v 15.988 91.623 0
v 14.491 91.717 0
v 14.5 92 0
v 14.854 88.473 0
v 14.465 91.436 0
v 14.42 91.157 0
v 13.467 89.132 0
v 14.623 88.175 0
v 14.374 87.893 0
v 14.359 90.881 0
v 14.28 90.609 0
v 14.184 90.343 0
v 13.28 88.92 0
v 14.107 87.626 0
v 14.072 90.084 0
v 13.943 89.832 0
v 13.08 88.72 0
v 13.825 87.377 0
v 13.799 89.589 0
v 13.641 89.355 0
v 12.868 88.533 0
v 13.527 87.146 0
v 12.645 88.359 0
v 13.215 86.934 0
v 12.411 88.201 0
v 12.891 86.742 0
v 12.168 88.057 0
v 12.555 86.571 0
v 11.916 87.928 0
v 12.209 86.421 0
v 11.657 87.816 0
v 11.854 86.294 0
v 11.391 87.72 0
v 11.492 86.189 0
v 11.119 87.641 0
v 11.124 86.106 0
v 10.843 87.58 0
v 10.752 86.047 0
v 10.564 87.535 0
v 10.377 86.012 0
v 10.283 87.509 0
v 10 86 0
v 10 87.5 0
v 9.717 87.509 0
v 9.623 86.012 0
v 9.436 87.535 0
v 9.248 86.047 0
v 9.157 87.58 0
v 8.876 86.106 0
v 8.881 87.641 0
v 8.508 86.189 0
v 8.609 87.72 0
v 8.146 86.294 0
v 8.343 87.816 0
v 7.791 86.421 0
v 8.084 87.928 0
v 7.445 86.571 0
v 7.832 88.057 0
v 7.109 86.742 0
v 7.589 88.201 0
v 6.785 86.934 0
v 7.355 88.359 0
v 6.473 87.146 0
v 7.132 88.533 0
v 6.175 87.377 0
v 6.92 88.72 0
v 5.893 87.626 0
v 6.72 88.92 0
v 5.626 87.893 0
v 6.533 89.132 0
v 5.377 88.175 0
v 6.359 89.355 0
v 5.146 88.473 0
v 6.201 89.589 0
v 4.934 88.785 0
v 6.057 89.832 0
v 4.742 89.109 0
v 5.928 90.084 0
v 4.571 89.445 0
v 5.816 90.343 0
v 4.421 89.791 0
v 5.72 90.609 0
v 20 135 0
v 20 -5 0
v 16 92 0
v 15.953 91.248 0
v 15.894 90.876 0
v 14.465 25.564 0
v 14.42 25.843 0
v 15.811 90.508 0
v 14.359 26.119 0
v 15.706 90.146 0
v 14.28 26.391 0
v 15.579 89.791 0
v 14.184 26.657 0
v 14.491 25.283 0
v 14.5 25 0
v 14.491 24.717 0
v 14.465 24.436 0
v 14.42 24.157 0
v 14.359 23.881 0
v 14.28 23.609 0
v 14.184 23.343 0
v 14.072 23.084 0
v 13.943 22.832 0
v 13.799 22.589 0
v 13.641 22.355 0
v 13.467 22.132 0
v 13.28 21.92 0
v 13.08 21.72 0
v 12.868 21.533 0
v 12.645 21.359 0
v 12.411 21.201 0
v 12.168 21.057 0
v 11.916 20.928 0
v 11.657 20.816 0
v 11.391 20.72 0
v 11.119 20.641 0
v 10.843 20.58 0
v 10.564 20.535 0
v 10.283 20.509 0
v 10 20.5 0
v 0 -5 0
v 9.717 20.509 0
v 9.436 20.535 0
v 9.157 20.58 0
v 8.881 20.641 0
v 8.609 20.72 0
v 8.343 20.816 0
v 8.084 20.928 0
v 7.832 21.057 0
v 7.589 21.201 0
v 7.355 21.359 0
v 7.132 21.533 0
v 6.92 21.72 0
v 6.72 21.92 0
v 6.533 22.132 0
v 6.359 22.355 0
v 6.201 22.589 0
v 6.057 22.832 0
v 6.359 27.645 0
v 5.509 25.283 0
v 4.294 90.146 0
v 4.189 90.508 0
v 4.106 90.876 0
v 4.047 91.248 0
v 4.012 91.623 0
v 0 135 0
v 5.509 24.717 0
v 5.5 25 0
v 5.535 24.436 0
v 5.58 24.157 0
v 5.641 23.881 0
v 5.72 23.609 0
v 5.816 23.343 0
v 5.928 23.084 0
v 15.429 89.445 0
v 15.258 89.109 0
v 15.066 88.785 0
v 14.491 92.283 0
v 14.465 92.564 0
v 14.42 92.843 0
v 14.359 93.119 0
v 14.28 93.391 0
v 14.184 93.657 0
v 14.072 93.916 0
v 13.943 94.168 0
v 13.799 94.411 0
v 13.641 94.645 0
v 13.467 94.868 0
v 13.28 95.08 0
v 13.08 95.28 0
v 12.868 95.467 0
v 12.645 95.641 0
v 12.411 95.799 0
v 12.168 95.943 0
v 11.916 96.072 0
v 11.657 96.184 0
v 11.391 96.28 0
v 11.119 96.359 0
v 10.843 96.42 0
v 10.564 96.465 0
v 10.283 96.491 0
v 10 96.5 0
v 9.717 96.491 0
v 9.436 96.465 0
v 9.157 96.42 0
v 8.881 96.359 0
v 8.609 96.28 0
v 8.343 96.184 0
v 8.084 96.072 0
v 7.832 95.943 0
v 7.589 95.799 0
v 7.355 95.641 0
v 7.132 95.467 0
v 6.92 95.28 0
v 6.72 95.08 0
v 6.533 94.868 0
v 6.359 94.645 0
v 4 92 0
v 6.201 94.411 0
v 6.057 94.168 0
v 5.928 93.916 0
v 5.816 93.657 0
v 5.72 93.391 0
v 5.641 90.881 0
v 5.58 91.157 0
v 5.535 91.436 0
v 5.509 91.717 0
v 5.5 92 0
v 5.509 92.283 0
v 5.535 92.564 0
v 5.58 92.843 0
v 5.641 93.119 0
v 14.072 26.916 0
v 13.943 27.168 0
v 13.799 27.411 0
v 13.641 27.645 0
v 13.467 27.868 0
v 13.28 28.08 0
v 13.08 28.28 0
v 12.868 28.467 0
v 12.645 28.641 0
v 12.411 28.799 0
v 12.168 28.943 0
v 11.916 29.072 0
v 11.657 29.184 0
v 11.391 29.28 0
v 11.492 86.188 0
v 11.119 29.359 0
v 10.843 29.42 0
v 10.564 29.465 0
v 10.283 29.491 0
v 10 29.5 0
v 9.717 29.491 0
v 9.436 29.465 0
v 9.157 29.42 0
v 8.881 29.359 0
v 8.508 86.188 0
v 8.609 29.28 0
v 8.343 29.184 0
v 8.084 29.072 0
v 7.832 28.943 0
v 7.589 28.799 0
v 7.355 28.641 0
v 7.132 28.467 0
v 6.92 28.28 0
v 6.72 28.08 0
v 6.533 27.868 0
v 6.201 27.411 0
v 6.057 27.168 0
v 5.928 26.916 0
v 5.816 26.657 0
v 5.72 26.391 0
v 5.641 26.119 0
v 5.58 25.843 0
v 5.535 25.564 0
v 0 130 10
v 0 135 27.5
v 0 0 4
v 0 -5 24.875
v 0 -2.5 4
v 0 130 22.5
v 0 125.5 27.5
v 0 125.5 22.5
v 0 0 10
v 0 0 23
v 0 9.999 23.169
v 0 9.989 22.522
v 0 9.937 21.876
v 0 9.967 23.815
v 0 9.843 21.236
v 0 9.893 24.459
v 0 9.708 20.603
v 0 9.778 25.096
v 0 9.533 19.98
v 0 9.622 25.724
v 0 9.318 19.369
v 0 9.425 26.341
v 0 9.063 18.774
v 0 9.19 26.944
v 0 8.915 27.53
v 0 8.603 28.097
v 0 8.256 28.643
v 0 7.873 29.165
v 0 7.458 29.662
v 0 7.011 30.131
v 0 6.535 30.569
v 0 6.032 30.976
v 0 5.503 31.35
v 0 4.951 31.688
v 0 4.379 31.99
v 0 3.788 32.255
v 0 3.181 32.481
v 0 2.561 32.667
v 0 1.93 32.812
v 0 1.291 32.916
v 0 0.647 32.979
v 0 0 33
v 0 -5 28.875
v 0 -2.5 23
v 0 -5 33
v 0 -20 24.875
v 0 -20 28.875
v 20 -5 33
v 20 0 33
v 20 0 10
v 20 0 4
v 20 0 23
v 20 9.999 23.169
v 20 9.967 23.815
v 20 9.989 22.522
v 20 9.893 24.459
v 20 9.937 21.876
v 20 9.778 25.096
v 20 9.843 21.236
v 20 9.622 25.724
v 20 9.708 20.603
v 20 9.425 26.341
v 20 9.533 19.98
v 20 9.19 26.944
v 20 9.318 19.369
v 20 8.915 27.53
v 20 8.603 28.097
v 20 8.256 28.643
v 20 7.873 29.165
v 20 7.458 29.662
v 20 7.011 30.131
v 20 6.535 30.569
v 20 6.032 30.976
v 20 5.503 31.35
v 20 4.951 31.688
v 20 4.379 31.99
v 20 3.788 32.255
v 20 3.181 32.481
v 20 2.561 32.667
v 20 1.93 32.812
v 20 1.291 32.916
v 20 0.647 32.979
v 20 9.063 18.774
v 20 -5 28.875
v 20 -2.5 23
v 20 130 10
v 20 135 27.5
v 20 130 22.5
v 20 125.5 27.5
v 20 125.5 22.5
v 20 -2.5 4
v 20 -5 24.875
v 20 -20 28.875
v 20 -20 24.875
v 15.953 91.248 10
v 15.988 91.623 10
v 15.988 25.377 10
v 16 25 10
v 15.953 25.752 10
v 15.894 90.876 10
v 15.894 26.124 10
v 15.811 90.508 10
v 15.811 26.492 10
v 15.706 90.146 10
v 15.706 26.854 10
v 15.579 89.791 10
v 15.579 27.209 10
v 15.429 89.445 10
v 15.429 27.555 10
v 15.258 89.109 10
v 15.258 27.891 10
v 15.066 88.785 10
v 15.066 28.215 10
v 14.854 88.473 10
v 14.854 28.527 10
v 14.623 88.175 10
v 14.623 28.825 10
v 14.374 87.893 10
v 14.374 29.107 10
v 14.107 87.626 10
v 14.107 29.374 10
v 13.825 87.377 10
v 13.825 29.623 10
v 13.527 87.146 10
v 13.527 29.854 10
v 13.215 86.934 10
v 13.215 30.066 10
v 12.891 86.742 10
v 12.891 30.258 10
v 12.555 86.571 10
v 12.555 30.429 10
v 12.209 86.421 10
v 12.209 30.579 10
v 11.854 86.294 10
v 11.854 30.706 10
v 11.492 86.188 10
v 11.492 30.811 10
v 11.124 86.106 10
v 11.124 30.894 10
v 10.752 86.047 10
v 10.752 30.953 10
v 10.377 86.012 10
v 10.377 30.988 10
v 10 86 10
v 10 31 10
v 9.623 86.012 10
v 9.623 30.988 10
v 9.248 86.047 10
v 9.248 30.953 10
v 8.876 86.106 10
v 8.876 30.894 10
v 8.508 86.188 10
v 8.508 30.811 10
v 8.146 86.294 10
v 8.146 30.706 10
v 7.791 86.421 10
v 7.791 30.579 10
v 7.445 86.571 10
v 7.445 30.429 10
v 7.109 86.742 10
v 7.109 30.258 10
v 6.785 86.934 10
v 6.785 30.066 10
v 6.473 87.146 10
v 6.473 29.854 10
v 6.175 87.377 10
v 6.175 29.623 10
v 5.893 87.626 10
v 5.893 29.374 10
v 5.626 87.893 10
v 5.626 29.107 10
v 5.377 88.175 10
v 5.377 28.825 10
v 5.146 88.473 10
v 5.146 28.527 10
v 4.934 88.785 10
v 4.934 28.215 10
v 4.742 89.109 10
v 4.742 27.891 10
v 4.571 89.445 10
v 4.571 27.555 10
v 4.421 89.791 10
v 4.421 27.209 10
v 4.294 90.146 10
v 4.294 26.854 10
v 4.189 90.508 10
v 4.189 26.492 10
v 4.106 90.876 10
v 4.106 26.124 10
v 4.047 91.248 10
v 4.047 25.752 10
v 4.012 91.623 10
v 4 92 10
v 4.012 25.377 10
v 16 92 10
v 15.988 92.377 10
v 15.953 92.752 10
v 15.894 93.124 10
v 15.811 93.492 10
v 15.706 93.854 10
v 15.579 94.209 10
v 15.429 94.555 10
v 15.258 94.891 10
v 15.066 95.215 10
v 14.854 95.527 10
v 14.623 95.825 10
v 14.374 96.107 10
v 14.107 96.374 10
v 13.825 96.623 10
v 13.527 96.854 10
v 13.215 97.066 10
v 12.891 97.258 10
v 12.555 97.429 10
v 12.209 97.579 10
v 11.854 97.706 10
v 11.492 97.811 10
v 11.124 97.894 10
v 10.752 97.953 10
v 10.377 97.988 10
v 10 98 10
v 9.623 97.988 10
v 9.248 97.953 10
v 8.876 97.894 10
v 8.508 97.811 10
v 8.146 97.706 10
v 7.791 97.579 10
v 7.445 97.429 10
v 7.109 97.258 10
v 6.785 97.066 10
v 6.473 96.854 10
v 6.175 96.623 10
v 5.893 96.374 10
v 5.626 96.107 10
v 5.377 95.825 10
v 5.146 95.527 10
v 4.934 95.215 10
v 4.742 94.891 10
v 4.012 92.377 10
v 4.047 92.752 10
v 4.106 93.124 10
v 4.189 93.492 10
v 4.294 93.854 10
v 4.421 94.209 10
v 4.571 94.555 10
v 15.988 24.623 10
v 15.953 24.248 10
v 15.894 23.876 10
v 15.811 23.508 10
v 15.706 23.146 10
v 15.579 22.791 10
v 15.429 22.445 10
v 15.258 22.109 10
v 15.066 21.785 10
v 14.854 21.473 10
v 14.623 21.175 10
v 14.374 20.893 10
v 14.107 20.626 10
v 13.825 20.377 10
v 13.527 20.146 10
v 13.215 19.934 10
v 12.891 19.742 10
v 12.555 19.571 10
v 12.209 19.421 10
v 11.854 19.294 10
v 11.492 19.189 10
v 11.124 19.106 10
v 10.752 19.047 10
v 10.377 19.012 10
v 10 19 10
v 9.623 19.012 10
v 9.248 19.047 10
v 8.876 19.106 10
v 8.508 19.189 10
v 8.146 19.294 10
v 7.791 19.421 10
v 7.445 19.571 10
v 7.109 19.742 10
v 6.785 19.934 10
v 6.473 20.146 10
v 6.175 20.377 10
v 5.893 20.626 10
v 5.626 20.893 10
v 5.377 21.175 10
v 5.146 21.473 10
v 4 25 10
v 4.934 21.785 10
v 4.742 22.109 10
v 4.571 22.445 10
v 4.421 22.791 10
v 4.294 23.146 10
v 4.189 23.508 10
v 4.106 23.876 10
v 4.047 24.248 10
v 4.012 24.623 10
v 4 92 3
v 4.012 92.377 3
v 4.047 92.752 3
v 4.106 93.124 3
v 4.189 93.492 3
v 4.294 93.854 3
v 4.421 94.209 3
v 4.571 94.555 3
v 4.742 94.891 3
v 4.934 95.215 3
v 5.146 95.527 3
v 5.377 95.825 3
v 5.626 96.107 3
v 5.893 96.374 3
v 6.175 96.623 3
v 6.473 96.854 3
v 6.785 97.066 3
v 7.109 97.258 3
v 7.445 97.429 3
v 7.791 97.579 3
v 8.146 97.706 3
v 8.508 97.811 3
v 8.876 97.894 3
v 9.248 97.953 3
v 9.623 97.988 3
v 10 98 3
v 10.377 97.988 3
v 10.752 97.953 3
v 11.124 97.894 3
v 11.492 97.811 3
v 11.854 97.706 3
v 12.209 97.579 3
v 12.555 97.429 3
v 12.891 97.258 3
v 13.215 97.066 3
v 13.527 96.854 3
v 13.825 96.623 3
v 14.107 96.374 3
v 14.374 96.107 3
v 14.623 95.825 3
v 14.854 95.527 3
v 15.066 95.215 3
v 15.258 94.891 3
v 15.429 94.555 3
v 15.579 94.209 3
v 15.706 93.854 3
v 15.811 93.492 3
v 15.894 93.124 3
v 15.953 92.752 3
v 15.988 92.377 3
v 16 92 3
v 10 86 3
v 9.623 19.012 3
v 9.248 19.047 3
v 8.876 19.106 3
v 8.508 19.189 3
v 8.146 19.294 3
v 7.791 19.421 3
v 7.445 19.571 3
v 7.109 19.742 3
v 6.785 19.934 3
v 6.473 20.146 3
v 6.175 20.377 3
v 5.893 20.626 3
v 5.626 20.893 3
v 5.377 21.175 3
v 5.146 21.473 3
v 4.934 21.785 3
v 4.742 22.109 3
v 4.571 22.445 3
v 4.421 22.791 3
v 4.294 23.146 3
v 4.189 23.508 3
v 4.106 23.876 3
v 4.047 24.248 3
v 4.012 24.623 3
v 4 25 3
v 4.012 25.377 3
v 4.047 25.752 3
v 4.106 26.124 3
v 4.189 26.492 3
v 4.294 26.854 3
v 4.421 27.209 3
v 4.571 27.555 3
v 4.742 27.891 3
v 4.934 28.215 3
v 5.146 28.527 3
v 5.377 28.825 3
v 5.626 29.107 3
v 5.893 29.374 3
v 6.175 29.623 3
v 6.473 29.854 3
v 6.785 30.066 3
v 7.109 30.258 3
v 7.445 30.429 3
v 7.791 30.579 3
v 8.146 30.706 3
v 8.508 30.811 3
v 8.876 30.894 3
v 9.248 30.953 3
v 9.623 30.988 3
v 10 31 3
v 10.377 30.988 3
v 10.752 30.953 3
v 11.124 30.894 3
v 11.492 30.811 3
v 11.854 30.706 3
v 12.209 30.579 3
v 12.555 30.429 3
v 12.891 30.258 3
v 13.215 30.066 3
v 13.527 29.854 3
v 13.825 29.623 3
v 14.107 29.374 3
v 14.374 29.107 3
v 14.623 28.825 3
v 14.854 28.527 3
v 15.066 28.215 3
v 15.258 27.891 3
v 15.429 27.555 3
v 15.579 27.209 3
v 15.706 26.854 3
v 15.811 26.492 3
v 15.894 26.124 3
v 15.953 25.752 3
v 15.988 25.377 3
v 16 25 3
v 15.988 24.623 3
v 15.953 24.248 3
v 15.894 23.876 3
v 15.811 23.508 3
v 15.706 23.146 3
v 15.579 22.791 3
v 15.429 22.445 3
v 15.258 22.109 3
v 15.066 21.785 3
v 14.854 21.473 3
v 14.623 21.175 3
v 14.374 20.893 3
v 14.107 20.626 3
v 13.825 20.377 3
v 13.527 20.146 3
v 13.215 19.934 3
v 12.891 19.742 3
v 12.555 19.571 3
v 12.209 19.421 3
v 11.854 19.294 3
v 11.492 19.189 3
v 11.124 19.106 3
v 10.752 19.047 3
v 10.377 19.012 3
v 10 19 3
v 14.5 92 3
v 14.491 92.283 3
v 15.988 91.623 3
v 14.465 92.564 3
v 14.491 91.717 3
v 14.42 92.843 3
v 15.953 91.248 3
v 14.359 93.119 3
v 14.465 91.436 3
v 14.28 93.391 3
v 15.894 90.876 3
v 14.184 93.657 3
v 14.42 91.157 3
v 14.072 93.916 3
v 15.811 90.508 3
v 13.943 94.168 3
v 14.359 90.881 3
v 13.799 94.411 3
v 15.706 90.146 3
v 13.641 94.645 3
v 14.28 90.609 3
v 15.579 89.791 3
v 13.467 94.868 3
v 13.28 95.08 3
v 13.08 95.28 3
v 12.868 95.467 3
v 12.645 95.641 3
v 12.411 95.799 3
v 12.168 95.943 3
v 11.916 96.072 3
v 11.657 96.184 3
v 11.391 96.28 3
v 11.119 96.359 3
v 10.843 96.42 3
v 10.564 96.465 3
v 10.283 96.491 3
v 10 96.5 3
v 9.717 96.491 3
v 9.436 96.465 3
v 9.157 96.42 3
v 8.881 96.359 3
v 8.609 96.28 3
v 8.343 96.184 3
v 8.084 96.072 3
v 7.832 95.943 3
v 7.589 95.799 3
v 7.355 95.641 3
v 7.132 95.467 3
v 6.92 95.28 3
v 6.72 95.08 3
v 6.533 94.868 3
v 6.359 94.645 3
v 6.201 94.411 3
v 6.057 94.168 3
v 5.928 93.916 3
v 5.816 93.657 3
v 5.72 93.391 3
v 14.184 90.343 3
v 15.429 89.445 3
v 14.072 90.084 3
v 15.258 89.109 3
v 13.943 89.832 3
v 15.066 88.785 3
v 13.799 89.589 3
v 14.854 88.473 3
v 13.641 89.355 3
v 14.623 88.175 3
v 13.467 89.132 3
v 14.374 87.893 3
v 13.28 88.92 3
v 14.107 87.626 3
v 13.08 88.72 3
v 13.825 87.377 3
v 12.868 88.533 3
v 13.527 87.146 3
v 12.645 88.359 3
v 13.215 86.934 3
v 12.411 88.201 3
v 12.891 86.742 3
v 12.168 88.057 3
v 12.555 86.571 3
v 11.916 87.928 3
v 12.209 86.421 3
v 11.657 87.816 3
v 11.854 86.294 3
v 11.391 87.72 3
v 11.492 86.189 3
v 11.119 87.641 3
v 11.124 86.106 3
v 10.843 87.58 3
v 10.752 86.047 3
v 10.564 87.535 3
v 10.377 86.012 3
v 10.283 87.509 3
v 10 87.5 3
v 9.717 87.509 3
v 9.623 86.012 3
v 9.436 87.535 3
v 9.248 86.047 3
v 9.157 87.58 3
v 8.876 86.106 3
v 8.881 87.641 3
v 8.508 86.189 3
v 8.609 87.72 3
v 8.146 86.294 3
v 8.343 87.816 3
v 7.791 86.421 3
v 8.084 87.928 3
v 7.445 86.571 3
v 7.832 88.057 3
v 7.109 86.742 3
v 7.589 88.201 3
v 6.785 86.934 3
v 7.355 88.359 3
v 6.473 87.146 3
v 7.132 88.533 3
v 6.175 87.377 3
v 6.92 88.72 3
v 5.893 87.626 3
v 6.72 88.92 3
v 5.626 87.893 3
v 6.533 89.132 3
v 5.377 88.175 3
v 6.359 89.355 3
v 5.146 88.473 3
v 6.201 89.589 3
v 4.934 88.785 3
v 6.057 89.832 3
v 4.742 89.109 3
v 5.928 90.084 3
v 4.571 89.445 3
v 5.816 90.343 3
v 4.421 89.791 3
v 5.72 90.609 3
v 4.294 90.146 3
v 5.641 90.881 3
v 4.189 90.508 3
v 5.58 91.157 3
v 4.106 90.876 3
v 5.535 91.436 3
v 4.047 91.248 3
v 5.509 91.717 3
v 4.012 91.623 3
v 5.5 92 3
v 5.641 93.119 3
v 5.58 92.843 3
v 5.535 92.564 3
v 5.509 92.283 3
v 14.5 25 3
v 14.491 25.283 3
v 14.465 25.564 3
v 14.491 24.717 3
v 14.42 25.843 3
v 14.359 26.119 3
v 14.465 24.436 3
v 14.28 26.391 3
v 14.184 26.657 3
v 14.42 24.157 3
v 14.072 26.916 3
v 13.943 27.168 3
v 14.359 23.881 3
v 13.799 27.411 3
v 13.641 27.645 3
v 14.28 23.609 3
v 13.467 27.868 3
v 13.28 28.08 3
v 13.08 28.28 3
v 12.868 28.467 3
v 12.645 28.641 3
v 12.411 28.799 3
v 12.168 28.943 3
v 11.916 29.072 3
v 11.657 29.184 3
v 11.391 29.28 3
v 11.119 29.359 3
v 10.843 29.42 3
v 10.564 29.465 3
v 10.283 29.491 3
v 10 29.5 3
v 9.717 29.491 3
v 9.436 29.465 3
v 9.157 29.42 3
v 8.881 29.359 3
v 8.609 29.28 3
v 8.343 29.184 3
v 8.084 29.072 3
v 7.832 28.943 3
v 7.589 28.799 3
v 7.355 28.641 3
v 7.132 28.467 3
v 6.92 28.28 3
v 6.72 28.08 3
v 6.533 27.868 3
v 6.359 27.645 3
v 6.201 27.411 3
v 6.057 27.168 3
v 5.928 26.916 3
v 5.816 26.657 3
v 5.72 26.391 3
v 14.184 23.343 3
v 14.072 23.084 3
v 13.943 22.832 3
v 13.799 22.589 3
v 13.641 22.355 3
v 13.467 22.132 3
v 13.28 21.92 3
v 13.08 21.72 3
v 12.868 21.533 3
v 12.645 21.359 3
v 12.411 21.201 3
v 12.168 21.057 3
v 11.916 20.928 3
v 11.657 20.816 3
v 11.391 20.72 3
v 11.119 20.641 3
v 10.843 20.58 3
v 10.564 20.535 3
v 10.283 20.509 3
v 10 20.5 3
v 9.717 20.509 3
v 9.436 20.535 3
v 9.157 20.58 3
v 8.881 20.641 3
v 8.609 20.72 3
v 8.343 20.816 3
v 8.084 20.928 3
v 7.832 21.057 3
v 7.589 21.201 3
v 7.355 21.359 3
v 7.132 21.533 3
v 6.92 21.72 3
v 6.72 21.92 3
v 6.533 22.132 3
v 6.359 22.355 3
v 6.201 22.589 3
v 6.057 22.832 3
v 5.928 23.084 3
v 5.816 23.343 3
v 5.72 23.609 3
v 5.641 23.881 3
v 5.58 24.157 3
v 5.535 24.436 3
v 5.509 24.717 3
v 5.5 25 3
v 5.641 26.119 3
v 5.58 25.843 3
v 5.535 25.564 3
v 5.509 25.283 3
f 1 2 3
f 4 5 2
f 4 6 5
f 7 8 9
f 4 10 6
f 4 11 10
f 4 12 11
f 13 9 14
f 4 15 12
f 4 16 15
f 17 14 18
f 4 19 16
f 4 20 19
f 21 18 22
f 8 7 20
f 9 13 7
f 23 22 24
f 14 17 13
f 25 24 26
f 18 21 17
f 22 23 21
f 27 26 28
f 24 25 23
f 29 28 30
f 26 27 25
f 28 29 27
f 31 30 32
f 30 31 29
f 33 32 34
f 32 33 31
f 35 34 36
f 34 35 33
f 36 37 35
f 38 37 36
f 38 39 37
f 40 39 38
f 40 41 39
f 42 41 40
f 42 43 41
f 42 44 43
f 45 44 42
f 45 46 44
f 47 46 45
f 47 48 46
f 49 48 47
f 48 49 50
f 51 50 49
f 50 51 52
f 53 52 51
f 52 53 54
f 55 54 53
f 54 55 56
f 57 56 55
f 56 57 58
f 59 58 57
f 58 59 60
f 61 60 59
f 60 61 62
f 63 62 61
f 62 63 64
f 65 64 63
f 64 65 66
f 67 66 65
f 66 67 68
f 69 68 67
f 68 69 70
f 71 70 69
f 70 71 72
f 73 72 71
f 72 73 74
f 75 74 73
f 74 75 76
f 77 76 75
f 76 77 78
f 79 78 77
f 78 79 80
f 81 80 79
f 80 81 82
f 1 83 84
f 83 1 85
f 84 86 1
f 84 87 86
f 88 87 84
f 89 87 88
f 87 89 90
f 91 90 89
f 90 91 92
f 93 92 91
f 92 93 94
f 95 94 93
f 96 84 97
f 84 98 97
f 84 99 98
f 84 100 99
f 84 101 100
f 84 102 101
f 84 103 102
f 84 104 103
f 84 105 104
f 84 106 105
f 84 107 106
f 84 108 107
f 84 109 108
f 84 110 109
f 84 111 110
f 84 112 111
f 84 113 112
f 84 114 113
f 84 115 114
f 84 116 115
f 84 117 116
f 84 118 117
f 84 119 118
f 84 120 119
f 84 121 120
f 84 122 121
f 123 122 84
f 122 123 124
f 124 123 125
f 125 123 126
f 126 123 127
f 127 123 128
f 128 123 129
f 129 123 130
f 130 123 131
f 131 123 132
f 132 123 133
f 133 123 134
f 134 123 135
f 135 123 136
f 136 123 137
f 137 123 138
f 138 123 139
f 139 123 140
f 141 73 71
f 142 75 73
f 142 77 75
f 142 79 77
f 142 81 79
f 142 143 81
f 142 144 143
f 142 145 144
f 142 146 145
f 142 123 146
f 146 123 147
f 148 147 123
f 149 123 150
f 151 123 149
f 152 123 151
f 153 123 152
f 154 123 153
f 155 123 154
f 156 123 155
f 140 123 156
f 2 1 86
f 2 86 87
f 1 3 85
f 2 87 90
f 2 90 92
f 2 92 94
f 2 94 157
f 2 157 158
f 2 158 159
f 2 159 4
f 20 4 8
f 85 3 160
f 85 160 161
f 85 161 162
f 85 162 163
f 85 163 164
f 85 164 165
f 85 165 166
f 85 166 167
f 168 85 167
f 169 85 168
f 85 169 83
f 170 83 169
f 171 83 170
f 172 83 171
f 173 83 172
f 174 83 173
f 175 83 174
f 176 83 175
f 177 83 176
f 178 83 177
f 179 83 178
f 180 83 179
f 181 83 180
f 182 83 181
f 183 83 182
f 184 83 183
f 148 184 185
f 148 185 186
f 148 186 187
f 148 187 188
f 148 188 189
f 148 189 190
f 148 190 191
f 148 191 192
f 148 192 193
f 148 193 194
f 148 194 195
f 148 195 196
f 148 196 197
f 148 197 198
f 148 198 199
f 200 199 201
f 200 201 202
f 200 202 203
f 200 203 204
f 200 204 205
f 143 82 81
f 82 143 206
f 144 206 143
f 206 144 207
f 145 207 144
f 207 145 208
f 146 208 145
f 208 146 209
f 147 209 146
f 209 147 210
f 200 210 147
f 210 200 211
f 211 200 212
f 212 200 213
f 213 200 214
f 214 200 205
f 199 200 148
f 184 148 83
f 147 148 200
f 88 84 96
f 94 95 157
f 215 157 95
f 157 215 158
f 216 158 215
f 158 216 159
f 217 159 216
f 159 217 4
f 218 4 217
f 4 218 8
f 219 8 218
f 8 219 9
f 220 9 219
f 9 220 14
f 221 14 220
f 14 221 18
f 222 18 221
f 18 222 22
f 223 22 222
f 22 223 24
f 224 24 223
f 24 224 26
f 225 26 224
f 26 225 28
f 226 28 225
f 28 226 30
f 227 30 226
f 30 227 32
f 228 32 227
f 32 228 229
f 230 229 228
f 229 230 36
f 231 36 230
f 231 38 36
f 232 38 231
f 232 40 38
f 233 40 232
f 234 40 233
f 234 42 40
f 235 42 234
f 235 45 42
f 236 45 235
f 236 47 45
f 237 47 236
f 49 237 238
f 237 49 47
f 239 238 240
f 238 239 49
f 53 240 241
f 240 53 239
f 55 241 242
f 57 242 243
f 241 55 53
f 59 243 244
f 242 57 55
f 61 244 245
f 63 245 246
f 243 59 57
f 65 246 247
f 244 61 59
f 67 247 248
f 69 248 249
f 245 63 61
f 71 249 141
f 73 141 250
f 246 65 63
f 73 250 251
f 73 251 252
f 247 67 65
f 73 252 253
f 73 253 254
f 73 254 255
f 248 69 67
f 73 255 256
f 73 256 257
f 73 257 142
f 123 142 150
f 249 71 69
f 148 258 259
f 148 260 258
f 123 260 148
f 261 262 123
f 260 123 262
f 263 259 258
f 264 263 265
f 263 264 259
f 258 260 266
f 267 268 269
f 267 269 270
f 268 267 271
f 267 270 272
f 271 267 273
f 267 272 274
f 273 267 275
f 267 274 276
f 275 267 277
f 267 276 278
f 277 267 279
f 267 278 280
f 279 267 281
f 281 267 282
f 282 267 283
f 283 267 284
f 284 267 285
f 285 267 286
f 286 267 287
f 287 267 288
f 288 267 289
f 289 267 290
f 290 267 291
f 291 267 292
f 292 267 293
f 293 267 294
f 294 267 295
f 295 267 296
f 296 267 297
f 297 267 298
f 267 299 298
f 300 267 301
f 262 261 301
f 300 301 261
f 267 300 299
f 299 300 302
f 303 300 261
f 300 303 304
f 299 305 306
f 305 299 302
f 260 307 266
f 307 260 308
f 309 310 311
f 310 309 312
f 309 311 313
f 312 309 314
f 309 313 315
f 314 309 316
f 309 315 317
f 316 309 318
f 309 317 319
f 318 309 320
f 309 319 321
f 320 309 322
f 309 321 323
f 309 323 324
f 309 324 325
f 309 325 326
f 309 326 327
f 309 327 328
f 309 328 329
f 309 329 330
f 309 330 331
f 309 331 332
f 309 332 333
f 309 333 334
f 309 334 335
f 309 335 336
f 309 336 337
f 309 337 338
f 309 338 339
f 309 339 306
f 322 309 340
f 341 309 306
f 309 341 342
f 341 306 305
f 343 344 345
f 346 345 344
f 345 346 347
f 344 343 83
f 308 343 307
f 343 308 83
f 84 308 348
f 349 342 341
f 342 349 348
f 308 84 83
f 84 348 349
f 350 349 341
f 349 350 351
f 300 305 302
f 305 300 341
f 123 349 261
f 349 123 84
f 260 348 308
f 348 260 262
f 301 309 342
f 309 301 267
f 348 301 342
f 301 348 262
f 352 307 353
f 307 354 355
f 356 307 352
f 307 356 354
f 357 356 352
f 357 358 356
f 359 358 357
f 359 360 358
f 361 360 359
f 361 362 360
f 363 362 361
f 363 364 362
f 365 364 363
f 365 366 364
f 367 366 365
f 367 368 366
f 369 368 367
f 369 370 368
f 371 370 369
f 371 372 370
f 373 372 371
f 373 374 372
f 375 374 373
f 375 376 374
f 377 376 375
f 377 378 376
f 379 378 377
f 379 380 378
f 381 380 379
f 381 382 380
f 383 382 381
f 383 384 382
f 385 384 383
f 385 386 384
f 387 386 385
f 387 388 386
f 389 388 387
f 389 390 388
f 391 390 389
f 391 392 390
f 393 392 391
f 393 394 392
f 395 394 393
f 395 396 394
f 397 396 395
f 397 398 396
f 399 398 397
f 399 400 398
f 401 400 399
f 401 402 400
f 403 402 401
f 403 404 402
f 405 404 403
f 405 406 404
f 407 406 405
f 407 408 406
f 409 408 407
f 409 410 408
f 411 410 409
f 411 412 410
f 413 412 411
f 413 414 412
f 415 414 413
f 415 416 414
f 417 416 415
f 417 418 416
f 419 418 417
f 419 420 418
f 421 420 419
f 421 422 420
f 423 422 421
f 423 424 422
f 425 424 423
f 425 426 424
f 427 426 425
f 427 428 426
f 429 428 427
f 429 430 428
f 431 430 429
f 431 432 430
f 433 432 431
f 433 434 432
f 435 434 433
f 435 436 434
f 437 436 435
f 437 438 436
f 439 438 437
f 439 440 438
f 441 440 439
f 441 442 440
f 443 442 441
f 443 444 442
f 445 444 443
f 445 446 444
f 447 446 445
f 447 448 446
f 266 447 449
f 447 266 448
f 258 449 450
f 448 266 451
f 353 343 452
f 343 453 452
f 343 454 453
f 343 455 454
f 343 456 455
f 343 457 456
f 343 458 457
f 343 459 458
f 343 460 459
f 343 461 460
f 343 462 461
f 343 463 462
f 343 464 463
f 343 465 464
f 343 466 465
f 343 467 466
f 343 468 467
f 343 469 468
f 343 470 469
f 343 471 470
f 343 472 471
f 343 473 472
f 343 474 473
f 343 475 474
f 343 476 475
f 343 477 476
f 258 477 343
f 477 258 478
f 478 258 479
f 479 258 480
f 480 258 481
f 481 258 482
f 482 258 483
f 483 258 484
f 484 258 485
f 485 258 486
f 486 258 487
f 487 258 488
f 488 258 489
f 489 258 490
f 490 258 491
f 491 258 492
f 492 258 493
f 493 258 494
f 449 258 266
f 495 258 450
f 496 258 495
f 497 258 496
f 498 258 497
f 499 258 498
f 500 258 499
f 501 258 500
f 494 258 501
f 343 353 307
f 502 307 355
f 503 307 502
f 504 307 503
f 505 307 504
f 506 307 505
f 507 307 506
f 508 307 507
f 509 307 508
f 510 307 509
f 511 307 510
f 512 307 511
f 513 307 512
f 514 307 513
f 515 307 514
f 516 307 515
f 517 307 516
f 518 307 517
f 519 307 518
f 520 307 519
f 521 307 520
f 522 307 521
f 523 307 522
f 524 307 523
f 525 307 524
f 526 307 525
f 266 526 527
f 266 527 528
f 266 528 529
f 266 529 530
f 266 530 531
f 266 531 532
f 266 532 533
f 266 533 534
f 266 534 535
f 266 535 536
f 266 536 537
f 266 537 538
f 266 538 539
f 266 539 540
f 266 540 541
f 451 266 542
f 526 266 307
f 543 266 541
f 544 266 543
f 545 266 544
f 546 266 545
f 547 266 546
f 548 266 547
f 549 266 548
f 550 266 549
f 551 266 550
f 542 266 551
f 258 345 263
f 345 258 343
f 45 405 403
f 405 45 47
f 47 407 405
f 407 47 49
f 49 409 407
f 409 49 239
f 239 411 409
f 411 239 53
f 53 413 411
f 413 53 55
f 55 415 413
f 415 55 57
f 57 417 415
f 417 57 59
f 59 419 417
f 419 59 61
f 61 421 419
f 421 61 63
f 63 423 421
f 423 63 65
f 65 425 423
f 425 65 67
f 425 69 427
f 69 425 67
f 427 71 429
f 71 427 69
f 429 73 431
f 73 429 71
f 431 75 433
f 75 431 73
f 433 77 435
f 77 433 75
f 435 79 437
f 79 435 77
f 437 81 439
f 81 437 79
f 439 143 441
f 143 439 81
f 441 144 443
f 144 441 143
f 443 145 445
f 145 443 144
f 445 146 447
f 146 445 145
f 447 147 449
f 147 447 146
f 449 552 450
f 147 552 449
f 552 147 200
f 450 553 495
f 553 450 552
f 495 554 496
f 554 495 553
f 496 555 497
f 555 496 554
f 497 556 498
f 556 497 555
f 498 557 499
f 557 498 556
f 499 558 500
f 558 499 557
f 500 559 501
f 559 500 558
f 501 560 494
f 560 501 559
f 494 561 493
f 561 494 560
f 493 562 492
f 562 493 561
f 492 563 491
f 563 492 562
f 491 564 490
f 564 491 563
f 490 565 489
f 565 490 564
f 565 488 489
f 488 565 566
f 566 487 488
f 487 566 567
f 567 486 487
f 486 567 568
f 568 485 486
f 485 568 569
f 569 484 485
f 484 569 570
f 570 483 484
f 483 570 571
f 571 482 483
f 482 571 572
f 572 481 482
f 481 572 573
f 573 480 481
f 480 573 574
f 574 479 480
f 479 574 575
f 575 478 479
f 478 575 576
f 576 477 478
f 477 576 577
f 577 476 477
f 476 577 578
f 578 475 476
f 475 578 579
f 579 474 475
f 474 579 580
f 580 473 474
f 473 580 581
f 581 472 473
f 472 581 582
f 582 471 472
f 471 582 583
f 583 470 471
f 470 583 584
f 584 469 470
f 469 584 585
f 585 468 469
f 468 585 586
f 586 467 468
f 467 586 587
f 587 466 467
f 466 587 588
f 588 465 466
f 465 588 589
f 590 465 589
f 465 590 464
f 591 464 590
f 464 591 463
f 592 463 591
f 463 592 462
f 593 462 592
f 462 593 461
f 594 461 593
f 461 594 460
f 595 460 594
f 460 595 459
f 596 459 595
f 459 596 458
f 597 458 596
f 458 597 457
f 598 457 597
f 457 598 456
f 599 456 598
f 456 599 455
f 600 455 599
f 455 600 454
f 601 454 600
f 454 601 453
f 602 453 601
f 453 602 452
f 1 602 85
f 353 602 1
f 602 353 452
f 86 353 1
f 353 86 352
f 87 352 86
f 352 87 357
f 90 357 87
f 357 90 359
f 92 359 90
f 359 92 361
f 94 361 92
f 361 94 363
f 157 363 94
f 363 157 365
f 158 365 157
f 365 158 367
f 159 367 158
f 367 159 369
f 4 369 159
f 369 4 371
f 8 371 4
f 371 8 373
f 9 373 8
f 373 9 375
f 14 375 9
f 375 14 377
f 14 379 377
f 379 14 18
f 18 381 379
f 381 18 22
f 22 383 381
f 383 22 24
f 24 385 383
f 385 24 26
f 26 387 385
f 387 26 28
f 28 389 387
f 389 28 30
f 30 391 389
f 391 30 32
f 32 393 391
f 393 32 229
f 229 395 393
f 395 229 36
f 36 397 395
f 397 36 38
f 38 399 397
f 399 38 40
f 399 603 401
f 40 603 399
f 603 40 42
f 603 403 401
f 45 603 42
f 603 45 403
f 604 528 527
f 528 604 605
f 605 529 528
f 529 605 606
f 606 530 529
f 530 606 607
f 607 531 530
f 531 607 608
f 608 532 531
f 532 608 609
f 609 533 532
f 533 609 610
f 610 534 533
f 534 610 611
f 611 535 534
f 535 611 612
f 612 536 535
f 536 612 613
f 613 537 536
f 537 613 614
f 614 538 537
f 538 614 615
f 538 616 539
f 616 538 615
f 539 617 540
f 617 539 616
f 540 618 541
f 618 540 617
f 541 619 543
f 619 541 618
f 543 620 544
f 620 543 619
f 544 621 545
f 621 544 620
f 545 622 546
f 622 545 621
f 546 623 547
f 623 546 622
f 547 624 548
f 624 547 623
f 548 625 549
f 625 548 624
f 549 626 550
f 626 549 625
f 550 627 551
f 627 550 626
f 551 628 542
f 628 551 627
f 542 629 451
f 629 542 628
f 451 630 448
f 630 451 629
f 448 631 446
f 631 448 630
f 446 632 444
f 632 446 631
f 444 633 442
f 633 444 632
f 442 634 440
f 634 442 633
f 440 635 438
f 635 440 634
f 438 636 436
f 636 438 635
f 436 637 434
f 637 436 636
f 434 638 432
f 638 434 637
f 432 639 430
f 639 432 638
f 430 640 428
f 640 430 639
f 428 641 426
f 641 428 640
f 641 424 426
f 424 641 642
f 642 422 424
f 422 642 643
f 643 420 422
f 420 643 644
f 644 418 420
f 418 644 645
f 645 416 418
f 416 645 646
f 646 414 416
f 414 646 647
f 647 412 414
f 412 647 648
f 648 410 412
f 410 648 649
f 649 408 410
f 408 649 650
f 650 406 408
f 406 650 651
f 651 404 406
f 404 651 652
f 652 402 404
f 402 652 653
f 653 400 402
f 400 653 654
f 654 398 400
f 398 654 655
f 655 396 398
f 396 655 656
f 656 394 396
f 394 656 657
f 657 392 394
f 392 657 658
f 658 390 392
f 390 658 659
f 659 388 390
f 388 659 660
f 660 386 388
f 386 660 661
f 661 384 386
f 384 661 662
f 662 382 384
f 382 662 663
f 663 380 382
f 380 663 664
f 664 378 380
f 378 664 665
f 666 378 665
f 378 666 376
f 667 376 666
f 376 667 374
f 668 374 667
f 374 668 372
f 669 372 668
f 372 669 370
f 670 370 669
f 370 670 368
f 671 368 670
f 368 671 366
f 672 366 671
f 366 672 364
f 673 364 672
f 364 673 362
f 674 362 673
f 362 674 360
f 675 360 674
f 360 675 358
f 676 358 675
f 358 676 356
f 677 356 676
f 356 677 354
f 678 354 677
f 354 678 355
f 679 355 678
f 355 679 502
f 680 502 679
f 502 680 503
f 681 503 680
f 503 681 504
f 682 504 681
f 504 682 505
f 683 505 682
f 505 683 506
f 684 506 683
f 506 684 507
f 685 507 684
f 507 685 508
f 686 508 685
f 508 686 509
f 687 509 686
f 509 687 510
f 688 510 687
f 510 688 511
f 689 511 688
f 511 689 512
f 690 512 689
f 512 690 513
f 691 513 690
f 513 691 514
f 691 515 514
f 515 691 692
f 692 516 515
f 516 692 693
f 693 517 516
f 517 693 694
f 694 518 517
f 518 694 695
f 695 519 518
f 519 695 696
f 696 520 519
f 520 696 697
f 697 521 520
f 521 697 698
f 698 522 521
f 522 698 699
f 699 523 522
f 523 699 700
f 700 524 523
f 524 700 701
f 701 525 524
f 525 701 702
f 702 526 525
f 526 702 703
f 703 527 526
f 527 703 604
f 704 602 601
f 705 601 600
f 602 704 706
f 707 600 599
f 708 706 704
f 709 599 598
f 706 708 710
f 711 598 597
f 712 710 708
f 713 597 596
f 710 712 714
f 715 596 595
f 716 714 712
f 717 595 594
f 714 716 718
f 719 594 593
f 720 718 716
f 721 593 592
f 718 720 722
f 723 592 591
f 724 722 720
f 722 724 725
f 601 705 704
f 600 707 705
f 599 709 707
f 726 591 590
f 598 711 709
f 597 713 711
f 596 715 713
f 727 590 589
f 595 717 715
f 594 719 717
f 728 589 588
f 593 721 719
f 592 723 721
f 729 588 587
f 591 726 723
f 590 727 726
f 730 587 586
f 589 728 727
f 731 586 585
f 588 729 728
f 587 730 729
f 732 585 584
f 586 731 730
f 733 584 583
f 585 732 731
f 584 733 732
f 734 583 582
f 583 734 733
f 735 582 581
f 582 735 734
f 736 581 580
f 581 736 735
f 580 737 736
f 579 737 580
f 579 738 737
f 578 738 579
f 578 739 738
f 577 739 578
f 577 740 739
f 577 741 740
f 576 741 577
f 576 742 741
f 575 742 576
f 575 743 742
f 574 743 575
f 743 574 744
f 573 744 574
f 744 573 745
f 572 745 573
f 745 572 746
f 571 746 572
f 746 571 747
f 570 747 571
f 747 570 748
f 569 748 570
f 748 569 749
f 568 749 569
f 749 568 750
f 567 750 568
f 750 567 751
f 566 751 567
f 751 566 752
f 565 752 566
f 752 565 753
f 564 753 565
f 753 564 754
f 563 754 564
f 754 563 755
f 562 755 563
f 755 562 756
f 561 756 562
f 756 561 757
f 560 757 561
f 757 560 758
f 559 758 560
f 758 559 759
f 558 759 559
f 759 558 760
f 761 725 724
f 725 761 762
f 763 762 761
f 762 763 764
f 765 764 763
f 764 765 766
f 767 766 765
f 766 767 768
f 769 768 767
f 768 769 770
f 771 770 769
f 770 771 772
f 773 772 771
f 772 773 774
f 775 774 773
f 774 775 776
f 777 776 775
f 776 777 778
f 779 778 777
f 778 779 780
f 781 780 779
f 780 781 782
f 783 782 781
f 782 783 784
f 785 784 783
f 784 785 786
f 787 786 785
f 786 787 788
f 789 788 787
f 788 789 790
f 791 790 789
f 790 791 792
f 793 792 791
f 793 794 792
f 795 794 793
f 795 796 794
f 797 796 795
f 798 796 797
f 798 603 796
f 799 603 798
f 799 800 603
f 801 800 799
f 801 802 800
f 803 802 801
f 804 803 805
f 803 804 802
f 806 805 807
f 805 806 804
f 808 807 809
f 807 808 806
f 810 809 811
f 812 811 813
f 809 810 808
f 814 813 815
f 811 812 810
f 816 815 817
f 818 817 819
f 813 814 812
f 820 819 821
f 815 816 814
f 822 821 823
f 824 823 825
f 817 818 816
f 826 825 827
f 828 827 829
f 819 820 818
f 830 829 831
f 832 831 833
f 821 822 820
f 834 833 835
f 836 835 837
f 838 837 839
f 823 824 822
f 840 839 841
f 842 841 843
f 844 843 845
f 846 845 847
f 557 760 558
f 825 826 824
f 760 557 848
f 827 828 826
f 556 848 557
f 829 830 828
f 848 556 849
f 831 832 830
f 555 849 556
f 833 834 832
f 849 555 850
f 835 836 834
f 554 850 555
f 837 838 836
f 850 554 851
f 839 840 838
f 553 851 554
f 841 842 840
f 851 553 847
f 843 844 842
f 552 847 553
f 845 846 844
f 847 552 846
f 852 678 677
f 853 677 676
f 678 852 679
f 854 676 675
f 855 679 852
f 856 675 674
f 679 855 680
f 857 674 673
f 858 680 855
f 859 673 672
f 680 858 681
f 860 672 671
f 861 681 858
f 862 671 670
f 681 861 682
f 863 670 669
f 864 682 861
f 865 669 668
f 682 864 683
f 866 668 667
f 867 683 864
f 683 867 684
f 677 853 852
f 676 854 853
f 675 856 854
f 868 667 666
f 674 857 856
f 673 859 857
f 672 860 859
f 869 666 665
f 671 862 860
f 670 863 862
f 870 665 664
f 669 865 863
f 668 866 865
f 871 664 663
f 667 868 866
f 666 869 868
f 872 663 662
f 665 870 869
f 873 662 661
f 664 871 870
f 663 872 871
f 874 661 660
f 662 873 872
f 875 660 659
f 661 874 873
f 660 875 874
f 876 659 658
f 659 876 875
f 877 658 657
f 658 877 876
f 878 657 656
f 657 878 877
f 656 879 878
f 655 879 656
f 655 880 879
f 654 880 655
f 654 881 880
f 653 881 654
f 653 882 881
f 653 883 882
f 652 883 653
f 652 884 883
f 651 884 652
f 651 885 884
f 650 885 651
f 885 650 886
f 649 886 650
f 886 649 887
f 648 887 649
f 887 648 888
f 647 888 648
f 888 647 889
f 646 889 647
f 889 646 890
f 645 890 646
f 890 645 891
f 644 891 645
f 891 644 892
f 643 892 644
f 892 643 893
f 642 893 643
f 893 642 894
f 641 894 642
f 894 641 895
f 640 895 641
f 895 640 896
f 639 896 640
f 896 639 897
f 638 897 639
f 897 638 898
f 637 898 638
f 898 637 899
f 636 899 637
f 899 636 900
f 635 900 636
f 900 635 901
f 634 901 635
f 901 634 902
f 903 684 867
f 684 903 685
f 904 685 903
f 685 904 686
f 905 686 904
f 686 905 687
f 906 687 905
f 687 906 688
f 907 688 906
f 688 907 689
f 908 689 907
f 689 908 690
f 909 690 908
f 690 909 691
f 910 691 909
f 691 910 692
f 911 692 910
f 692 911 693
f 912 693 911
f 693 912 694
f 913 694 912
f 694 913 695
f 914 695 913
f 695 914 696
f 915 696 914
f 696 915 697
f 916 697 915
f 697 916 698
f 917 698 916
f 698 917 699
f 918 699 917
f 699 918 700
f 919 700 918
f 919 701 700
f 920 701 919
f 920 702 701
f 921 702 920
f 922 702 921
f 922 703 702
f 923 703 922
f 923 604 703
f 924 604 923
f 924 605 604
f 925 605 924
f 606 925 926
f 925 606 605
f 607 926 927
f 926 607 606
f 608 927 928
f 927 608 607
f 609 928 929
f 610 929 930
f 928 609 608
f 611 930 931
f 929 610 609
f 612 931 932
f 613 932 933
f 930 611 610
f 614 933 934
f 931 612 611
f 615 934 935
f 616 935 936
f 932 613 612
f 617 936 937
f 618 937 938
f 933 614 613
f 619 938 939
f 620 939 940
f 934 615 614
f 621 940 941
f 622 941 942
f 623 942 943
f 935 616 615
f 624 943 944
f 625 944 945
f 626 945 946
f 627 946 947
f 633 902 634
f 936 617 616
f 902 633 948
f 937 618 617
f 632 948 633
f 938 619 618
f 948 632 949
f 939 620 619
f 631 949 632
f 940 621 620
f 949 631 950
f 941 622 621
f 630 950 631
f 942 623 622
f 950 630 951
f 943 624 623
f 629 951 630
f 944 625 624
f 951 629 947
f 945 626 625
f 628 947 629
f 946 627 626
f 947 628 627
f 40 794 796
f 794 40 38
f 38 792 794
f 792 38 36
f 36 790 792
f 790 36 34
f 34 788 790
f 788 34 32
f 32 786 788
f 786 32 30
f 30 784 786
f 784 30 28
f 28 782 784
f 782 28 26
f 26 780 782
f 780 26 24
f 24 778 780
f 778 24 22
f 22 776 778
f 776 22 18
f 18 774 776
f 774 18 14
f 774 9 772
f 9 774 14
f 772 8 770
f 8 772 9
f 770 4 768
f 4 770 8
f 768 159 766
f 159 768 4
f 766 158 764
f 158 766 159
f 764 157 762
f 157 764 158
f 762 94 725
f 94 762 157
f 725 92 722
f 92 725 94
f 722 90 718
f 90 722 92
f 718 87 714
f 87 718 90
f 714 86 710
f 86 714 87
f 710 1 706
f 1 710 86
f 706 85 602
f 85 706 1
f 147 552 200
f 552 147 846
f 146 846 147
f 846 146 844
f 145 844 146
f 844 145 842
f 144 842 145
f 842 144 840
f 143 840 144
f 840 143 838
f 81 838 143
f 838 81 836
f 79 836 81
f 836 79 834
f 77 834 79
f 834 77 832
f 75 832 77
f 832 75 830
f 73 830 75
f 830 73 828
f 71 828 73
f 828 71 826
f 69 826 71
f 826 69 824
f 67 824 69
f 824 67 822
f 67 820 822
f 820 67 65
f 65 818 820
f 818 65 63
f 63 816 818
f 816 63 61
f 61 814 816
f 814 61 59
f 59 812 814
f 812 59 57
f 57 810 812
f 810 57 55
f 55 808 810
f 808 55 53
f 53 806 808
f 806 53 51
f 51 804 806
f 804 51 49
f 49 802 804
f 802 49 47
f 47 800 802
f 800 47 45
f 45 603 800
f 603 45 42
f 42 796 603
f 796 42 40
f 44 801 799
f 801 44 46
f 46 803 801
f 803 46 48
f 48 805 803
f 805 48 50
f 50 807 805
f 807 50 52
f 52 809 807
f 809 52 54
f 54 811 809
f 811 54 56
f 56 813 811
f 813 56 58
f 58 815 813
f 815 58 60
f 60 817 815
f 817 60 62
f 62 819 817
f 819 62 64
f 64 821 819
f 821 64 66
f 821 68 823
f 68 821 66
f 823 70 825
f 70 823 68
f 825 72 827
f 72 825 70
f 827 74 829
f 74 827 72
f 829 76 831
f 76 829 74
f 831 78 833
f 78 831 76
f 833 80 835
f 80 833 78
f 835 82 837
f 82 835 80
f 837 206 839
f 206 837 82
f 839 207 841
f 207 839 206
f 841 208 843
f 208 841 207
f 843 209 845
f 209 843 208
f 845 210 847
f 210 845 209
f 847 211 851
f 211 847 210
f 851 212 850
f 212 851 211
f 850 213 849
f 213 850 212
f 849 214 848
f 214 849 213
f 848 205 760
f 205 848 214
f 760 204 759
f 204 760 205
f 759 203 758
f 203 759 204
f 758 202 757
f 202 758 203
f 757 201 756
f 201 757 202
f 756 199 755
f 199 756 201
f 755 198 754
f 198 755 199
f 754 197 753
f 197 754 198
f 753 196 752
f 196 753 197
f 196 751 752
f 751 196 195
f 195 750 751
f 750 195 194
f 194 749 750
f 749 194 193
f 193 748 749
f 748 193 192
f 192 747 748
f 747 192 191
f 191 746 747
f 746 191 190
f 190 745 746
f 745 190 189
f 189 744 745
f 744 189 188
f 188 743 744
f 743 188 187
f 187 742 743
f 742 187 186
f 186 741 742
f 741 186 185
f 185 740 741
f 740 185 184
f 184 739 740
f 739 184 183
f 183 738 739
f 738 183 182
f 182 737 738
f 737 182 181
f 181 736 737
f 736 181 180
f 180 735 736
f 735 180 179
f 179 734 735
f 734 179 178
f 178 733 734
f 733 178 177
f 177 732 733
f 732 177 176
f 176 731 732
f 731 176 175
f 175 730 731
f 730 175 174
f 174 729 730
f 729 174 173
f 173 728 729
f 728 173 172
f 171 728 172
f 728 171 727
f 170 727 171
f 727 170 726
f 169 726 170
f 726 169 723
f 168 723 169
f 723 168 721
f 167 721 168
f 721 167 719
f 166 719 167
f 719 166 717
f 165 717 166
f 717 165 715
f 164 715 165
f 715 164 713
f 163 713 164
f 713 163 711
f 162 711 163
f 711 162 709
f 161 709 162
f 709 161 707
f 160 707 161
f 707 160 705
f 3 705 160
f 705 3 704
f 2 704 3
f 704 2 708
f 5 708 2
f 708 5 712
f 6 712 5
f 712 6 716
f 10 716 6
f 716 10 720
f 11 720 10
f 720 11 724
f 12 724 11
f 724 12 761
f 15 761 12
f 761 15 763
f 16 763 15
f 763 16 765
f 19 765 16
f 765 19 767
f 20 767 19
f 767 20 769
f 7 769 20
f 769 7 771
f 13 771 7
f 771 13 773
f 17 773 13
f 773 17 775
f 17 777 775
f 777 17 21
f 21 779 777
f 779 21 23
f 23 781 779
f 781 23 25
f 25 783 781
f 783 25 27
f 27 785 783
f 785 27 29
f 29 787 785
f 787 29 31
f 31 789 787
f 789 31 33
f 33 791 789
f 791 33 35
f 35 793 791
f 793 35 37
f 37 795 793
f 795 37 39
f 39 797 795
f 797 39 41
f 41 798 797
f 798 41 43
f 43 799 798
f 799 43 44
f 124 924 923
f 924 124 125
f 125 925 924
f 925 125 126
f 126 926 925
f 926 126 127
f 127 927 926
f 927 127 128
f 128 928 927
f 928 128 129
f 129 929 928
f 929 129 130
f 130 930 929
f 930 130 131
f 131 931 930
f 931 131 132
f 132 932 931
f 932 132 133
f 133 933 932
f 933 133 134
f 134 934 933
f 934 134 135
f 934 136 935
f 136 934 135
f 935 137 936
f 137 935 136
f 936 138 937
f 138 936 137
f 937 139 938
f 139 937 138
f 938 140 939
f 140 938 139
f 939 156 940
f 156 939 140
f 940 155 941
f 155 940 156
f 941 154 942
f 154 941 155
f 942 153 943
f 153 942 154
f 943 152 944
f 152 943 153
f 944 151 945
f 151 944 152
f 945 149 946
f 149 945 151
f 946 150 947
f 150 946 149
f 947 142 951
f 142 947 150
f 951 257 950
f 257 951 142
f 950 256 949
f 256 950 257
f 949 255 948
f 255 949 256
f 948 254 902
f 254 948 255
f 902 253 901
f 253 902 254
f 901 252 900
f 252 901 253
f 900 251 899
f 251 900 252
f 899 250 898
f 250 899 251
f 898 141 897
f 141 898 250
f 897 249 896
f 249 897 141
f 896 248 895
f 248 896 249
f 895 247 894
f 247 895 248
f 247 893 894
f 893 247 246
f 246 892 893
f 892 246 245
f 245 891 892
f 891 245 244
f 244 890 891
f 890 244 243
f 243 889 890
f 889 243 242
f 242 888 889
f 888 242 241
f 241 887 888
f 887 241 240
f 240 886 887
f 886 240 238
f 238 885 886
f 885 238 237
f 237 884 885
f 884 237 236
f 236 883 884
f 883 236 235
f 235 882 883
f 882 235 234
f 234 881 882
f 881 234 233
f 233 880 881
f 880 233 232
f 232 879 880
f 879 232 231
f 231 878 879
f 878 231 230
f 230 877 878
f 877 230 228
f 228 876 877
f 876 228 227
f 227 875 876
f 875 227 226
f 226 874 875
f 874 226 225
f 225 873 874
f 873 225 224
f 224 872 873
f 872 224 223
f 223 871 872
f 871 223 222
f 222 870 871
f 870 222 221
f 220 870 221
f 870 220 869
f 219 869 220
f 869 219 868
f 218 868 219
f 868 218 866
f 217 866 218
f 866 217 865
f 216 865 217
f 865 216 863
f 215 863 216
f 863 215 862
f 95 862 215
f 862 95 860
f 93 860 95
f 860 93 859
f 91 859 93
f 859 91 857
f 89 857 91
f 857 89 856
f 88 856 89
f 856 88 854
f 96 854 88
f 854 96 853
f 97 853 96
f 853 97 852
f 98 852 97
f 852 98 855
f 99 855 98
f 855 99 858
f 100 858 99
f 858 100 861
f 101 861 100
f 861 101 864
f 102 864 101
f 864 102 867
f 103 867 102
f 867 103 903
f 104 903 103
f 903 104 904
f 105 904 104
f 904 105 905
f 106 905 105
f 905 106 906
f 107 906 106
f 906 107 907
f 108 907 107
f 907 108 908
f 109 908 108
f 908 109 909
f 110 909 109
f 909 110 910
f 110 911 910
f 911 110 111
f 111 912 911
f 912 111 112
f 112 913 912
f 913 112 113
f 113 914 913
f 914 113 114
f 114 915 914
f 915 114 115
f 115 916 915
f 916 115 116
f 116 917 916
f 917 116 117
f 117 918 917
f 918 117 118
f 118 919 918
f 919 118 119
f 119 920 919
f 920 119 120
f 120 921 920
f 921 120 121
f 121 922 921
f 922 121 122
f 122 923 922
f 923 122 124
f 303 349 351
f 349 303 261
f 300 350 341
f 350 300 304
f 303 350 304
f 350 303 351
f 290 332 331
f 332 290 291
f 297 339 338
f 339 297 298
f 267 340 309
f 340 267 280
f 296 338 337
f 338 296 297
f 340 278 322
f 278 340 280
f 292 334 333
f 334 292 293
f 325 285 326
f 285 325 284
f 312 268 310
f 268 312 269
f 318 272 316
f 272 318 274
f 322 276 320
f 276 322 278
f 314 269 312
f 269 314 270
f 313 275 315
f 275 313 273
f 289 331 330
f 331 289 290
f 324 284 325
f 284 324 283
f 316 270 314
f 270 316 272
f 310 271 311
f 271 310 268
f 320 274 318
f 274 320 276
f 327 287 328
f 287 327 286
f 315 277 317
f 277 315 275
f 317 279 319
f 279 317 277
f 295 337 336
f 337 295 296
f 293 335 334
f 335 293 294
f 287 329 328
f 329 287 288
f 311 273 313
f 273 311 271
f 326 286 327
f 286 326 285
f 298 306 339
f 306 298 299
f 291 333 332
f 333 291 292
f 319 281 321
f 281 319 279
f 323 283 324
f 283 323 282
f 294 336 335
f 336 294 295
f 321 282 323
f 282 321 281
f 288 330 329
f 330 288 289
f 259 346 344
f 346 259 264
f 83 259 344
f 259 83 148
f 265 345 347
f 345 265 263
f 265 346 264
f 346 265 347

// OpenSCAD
$fn = 100;

/*
Can holder MTB

Tested w/ Giant Talon 2 (2022) and Marin Drift Zone 1

Infill: 40%
*/

/*

Type: can_height_offset / base_width / base_depth_offset

Normal 12oz can: 122 / 20 / 0
Keystone 12oz: 133
Yerba Mate: 15.5 oz
Red Bull: 8.4oz: 136 / 15 / -6.5

*/

can_height_offset = 122;
base_width = 20;
base_depth_offset = 0; // For Non-12oz Cans

can_height = can_height_offset + 8; // 12.cm
base_depth = 10;                    // 1cm
screw_small_depth = 3;
screw_thread_diameter = 9;
bolt_head_diameter = 12;                        // 6mm for M5 bolt
dist_between_holes = 55;                        // 2.14inch / 64mm
hole_offset = 25;                               // 2cm from origin
bottom_lip_height = 4.5;                        // 4.5mm 2cm (1cm + xyz)
bottom_lip_thickness = 5;                       // 5mm
bottom_lip_base = 5;                            // 10mm
bottom_lip_extrusion = 12.5 + base_depth + base_depth_offset; // 10.5mm
upper_lip_base = 5;
upper_lip_thickness = 23 + base_depth + base_depth_offset; // height basically
upper_pushness_thickness = 4;
upper_pusher_base = 15;
upper_can_hook_height = 10;
upper_can_hook_base = 5;
upper_can_hook_width = 5;
upper_hook_radius = 10;
upper_lip_difference = 2.50;

/*
translate([-20,120,base_depth-2]) {
rotate([64,0,20]){
color([1,0,0]) {
import("soda_can.stl");
}
}
}
*/

module
pieSlice(a, r, h)
{
    // a:angle, r:radius, h:height
    rotate_extrude(angle = a) square([ r, h ]);
}

// Base w/ Screw Holes
linear_extrude(base_depth)
{
    difference()
    {
        difference()
        {
            square([ base_width, can_height ]);
            translate([ base_width / 2, hole_offset, 0 ])
            {
                circle(d = bolt_head_diameter);
                translate([ 0, (bolt_head_diameter) + dist_between_holes, 0 ])
                {
                    circle(d = bolt_head_diameter);
                }
            }
        }
    }
}

// Screw Hole Padding
linear_extrude(screw_small_depth)
{
    translate([ base_width / 2, hole_offset, 0 ])
    {
        difference()
        {
            circle(d = bolt_head_diameter);
            circle(d = screw_thread_diameter);
        }
        translate([ 0, (bolt_head_diameter) + dist_between_holes, 0 ])
        {
            difference()
            {
                circle(d = bolt_head_diameter);
                circle(d = screw_thread_diameter);
            }
        }
    }
}

// Upper Hook
difference()
{
    linear_extrude(upper_lip_thickness)
    {
        translate([ 0, -upper_lip_base, 0 ])
        {
            square([ base_width, upper_lip_base ]);
        }
    }

    translate([ -2.5, -upper_lip_difference, base_depth / 2.5 ])
    {
        linear_extrude(upper_lip_thickness - 10 - (base_depth / 2.5))
        {
            square([ base_width + 5, upper_lip_difference ]);
        }
    }
}

// Upper Hook Push Lip
translate([ 0, 0, (upper_lip_thickness * 7 / 8) - upper_pushness_thickness ])
{
    linear_extrude(upper_pushness_thickness)
    {
        translate([ 0, -upper_pusher_base - upper_lip_base, 0 ])
        {
            square([ base_width, upper_pusher_base ]);
        }
    }
}

// Upper Hook - Curved Hook
translate([ base_width, 0, upper_lip_thickness - 10 ])
{
    rotate([ 0, -90, 0 ])
    {
        pieSlice(90 + 25, upper_hook_radius, base_width);
    }
}

// Bottom Lip

linear_extrude((bottom_lip_extrusion) + bottom_lip_thickness)
{
    translate([ 0, can_height, 0 ])
    {
        square([ base_width, bottom_lip_base ]);
    }
}

translate([ 0, can_height - bottom_lip_height, (bottom_lip_extrusion) ])
{
    linear_extrude(bottom_lip_thickness)
    {
        square([ base_width, bottom_lip_height ]);
    }
}
